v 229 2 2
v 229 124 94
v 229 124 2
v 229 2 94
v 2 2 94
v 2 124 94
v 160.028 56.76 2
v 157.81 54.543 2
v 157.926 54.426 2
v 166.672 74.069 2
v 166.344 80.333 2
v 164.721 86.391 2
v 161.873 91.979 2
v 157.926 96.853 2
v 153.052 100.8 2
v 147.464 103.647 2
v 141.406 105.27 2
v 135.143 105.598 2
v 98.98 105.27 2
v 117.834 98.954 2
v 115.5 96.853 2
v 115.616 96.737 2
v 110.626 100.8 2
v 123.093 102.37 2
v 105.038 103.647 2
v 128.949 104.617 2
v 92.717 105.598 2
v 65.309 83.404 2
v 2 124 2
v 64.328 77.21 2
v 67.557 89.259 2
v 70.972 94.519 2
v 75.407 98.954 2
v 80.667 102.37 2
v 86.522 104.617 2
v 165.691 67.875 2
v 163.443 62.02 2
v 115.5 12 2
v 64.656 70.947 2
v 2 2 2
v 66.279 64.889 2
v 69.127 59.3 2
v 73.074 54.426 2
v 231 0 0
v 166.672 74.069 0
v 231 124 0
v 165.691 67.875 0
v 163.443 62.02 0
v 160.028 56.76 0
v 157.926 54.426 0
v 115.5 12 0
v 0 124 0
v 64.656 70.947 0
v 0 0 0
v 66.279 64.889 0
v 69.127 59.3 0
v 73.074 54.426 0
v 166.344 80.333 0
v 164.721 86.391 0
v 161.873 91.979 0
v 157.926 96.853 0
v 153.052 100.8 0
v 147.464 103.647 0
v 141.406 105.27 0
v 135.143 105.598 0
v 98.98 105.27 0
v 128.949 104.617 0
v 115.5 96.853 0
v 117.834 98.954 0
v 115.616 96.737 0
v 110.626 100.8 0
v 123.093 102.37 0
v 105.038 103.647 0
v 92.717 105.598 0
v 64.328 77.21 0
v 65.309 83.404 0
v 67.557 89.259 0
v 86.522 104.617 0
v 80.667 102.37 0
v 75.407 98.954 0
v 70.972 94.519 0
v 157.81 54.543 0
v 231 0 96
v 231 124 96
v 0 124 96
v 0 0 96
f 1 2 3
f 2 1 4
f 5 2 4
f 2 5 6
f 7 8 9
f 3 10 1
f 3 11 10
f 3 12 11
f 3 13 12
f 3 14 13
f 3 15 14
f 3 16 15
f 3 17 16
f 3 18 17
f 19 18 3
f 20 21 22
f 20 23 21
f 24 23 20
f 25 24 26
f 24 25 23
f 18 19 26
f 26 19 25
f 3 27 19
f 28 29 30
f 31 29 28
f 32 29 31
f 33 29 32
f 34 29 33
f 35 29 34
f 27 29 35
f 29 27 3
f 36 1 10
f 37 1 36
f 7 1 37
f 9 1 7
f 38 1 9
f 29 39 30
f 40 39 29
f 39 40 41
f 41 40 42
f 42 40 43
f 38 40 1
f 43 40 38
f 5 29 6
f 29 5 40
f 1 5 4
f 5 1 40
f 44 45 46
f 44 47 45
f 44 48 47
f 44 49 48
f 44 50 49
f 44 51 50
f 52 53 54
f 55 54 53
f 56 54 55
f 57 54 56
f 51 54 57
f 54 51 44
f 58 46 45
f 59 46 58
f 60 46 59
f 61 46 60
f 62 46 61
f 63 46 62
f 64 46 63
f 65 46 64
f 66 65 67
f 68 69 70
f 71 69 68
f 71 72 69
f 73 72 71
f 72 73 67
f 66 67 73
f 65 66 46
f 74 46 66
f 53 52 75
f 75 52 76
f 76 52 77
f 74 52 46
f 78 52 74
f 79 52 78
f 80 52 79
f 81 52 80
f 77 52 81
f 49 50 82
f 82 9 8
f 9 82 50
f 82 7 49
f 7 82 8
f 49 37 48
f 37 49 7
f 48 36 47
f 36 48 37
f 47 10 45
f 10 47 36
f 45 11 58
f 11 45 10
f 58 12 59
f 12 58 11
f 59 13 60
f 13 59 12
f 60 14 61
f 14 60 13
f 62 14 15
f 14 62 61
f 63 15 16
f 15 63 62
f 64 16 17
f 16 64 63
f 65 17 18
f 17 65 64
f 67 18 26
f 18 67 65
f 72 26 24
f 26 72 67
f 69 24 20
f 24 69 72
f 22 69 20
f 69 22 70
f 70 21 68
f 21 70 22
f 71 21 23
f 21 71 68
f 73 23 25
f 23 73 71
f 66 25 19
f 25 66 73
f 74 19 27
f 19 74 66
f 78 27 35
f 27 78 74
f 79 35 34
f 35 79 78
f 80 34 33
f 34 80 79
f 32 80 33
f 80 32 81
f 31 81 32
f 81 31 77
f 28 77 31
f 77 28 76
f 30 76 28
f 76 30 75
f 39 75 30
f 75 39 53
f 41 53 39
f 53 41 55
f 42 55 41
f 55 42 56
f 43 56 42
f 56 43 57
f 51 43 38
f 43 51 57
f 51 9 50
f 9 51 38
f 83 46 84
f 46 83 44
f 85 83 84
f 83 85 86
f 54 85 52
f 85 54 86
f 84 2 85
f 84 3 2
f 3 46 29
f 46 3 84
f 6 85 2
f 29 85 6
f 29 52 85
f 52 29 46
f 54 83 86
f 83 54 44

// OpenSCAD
longSide = 227;
depth = 120;
height = 92;
shell = 4;

difference() {

    // Shown piece
    
    cube( [ longSide + shell, depth + shell, height + shell ] );
    // Cut out piece
    union() {
        translate( [ shell/2, shell/2, shell/2 ] ) {
            cube( [ longSide, depth, height ] );
        }
        linear_extrude(height = 4) {
            translate( [ shell, shell, 0 ] ) {
                //flat_heart();
            }
            translate( [ ( longSide + shell ) / 2, depth / 10, 0 ] ) {
                rotate( [ 0, 0, 45 ] ) {
                    scale( [ 3, 3, 0 ] ) {
                        flat_heart();
                    }
                }
            }
            
            translate( [ longSide, shell, 0 ] ) {
                rotate( [ 0, 0, 90 ] ) {
                    //scale( [ 3, 3, 0 ] ) {
                        //flat_heart();
                    //}
                }
            }
        }
        translate( [ 0 + ( shell / 2 ), depth + ( shell / 2 ), 0 + ( shell / 2 ) ] ) {
            cube( [ longSide, shell, height ] );
        }
    }

    
}



module flat_heart() {
  square(20);

  translate([10, 20, 0])
  circle(10);

  translate([20, 10, 0])
  circle(10);
}
